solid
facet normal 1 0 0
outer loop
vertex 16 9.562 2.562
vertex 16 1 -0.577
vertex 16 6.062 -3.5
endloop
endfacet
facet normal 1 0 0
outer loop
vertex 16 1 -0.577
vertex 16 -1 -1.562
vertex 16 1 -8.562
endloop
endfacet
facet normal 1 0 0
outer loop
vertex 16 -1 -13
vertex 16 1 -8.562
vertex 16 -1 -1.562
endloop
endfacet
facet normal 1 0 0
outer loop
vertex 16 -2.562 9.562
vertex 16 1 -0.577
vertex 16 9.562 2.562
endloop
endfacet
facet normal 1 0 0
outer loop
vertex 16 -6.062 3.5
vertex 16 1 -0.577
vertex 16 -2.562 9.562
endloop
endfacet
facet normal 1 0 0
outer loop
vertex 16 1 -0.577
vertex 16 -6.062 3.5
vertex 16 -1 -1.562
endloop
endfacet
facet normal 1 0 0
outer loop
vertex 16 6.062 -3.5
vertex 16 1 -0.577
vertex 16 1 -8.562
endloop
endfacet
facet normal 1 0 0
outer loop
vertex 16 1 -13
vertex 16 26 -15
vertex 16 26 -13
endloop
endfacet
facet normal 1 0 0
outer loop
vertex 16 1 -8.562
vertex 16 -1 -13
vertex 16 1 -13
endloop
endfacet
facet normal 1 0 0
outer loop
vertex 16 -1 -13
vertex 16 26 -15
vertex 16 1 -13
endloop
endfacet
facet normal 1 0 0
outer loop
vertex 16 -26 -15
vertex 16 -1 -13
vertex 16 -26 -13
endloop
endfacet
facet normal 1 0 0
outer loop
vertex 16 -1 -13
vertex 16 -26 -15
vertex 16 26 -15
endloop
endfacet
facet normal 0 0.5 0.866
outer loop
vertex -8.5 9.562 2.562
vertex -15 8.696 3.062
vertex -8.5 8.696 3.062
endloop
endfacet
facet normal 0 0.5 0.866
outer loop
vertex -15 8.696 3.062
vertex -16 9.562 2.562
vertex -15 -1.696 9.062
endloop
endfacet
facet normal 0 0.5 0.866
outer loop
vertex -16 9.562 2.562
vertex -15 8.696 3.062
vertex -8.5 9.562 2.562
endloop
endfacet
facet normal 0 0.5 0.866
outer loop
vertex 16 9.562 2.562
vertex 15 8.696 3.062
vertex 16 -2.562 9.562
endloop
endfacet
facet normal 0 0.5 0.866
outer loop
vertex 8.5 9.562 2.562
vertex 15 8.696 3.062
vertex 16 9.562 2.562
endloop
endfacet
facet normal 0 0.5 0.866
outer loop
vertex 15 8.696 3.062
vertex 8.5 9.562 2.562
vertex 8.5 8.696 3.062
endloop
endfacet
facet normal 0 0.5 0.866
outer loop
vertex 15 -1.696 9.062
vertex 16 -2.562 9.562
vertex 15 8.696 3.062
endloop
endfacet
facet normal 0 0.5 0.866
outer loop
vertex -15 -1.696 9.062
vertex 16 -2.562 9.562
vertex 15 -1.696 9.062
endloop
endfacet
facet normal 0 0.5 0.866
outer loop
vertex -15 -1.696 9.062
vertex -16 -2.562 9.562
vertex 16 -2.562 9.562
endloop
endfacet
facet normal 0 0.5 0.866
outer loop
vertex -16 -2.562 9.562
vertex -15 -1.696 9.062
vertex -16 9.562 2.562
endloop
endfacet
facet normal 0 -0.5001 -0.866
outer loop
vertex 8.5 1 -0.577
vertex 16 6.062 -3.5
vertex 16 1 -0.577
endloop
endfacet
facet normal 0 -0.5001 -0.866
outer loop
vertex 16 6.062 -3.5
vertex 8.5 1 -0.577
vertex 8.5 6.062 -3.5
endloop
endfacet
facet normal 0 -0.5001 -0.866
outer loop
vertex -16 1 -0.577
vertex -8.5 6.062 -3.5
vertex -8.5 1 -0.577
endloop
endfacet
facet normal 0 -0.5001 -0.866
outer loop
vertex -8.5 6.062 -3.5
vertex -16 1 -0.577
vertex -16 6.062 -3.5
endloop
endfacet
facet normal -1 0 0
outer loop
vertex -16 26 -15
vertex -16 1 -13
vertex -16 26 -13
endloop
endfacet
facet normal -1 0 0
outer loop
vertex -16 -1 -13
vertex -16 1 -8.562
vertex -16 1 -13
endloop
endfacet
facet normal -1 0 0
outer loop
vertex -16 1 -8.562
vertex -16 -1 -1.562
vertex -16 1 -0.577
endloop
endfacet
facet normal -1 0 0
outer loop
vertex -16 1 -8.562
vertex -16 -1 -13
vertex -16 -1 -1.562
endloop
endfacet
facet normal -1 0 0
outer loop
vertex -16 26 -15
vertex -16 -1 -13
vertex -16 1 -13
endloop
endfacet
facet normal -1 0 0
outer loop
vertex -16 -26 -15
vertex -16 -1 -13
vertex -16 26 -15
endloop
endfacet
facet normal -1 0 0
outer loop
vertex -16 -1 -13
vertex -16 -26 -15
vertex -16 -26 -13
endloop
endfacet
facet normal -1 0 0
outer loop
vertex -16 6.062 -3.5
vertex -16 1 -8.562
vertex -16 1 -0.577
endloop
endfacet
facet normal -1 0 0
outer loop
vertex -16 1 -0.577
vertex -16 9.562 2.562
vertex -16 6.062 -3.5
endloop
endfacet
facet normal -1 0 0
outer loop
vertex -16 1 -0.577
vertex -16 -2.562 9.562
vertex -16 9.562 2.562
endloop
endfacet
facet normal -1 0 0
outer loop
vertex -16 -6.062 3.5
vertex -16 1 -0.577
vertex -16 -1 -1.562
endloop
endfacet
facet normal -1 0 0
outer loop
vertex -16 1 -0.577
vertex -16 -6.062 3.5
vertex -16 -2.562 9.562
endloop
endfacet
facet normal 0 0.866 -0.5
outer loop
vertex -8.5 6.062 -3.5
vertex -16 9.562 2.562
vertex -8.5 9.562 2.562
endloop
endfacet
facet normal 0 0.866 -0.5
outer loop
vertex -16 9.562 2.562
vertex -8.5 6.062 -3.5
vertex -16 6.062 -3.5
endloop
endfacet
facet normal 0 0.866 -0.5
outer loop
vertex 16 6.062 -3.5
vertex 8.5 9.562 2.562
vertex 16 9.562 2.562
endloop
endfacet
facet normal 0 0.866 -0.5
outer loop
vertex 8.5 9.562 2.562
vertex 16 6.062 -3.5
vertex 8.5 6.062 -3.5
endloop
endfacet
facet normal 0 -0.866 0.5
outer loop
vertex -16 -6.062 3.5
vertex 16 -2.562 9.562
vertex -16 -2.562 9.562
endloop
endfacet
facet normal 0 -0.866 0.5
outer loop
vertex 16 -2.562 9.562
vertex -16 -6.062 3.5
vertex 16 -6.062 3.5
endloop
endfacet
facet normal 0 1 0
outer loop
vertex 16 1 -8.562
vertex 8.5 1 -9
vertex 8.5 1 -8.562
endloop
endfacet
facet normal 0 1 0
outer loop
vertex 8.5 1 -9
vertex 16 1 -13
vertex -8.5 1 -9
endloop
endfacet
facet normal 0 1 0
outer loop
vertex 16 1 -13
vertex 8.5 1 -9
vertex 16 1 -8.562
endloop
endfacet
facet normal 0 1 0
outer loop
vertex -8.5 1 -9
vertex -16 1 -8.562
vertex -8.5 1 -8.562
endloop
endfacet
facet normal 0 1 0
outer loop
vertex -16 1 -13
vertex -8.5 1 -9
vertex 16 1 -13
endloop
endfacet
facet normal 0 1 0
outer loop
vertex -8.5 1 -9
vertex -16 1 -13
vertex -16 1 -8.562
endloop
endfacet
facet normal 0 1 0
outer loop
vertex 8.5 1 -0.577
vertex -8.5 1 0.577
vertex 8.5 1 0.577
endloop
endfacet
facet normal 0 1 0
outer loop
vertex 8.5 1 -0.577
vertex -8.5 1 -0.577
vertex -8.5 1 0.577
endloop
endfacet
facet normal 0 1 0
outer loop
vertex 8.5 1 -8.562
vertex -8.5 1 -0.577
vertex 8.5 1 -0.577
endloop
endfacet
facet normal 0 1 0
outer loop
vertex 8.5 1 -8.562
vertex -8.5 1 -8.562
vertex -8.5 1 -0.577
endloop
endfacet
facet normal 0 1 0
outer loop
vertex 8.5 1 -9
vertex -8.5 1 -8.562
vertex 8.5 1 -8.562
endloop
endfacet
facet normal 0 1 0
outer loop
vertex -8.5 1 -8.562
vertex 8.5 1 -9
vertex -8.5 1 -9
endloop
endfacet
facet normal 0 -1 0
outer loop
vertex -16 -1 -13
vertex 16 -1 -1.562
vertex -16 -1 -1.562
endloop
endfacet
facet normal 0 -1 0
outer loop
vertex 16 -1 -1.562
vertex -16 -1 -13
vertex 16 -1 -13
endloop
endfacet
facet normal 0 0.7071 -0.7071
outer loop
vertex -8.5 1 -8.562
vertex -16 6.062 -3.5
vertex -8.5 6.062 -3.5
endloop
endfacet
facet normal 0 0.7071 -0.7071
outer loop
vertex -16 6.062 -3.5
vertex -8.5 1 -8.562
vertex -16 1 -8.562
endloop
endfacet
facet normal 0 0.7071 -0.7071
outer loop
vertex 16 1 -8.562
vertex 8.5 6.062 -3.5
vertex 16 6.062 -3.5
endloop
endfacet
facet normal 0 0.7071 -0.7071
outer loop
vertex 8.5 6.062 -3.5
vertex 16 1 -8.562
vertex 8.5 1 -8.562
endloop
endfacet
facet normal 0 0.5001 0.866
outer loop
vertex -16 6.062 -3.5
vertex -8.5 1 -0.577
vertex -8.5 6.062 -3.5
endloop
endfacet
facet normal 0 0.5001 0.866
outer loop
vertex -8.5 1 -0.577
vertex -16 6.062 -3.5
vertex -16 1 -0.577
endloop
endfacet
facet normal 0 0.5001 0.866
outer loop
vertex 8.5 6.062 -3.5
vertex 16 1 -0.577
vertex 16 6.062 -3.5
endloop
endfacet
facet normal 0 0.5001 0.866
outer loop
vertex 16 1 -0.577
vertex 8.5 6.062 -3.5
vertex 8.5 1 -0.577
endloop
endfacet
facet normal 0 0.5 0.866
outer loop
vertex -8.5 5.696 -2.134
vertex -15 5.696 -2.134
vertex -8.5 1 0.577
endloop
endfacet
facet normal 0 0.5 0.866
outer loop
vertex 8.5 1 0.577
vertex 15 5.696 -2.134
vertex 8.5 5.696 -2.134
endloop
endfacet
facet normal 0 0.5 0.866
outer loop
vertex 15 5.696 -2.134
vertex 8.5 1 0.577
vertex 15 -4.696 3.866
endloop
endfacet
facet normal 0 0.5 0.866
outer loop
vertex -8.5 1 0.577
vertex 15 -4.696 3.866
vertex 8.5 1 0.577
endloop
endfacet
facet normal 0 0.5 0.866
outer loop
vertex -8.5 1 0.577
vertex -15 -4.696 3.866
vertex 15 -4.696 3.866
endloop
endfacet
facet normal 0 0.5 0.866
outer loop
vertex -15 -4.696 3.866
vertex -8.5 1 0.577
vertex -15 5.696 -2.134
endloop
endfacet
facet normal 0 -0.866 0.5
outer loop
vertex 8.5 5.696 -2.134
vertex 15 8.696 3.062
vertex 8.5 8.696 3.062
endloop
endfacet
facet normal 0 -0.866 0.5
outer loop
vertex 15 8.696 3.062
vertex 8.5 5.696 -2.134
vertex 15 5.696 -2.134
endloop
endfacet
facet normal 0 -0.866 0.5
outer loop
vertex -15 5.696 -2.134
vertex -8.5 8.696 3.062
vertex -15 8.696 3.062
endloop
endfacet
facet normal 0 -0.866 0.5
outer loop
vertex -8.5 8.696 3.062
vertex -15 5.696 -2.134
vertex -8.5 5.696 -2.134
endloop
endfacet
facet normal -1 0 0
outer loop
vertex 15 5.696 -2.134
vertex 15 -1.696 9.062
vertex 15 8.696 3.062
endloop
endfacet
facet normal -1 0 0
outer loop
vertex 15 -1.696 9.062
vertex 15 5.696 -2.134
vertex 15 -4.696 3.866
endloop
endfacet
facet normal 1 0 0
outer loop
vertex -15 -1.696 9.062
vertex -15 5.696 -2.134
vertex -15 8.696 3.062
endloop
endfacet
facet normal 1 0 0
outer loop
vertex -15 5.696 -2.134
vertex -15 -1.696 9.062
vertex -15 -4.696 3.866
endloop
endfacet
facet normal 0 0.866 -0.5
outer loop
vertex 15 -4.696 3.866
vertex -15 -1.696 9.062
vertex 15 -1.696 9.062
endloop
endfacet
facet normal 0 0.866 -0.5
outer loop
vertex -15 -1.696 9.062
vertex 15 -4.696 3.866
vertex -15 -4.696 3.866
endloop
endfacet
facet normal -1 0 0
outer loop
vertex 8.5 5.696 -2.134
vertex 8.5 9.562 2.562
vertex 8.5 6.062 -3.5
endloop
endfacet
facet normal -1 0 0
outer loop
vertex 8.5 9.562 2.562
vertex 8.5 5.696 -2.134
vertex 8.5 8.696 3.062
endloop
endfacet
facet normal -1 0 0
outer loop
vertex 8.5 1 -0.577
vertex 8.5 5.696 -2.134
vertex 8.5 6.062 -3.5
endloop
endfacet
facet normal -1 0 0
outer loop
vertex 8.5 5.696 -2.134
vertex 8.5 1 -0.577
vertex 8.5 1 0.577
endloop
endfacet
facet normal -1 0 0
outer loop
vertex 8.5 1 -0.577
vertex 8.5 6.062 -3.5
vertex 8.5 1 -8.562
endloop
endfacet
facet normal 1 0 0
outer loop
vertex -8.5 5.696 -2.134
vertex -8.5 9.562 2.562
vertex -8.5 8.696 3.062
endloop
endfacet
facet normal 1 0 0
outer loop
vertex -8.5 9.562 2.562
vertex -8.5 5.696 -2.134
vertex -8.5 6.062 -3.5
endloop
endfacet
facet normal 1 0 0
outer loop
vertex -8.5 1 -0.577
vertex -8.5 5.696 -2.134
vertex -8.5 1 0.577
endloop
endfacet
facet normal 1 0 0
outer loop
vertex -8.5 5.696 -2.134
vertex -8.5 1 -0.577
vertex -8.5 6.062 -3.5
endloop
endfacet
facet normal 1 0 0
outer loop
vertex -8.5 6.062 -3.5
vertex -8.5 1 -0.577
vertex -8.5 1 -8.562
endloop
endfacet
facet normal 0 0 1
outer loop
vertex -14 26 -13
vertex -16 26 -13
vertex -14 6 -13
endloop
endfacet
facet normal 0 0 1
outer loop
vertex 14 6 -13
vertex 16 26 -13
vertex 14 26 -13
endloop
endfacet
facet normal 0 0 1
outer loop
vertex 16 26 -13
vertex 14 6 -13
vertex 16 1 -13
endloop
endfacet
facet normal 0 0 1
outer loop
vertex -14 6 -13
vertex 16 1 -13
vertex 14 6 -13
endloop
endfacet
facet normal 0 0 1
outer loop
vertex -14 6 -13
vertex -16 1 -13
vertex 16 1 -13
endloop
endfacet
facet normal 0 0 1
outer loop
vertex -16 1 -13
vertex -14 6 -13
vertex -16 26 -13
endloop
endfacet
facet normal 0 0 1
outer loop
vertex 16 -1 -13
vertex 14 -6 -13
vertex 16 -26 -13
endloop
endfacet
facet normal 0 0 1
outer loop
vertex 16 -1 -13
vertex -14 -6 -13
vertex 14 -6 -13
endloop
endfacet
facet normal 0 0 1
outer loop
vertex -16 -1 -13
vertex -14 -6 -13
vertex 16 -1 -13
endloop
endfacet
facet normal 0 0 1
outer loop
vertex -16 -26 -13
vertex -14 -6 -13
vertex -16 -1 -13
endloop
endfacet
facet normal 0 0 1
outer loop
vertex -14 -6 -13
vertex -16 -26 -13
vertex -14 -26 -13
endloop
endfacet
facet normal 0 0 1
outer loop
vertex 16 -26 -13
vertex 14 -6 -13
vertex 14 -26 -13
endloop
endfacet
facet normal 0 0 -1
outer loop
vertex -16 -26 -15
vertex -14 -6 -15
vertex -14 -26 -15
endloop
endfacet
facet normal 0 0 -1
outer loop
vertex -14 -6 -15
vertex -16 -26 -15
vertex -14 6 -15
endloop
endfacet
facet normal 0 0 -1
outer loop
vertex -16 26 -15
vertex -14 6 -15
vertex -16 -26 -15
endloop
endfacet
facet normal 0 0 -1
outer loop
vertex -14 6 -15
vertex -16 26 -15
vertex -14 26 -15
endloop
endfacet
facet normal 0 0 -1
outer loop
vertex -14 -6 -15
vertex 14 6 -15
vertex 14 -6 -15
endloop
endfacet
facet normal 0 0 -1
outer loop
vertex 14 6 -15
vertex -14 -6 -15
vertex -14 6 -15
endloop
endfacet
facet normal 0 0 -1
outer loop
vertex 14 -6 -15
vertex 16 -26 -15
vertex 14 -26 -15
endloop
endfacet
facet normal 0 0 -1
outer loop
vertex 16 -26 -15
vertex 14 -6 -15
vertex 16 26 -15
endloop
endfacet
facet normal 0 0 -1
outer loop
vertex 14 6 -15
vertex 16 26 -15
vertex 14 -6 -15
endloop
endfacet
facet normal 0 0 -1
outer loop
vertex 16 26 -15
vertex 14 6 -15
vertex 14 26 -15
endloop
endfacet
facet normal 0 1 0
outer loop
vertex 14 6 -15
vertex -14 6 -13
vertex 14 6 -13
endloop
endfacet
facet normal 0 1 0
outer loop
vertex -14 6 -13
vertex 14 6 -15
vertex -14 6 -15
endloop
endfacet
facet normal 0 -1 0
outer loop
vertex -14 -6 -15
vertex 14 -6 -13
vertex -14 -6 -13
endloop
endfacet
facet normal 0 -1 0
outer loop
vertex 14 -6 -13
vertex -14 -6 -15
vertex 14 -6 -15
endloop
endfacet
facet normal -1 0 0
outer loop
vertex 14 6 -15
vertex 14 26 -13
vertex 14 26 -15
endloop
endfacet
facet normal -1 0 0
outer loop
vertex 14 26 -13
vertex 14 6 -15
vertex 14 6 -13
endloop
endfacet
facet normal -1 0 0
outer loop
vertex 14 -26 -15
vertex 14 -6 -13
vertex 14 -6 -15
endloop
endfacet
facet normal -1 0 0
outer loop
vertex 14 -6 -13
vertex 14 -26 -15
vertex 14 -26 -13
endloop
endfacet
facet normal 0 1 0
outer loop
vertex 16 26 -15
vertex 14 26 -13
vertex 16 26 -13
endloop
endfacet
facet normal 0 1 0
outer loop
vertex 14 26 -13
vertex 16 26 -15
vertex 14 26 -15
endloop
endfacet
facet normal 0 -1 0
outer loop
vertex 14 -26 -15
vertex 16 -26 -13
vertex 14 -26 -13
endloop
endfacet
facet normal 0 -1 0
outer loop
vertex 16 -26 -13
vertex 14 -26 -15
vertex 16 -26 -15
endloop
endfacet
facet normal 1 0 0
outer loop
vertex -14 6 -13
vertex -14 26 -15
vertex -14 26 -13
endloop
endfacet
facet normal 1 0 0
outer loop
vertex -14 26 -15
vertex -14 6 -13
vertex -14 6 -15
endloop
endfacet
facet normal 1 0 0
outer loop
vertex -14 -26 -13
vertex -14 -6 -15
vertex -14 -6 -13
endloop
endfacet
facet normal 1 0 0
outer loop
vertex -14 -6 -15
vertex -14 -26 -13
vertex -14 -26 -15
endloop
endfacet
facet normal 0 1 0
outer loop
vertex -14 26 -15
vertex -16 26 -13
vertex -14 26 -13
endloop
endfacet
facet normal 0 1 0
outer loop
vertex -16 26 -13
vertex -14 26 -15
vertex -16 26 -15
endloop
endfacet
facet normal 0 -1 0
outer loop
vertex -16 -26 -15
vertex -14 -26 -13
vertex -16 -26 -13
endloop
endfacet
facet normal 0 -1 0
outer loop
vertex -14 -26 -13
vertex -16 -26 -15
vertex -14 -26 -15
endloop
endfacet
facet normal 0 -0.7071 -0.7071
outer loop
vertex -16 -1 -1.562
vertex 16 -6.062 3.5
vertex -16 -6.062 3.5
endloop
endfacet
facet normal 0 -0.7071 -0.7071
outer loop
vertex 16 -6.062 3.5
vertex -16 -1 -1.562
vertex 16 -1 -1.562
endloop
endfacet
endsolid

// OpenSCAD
// This is designed to support the case from http://www.thingiverse.com/thing:92208
// The angle of the support should always be 45 degrees so that it can be printed without
//   support.

/* [Global] */
// Positive angles point camera case down, negative point up
angle=-30; // [-45:45]

difference() {

union() {
// Holder
rotate([angle,0,0])
translate([0,0,3.5]) cube([30+2,12+2,7],center=true);
// Up/Down part
translate([0,0,-5]) cube([30+2,2,18],center=true);

color("red")
translate([0,0,0]) translate([0,0,0]) rotate([0,90,0]) linear_extrude(height = 32, center = true, convexity = 10, twist = 0)
polygon(  points=[[0,0],[7*cos(angle)-7*sin(angle),0],[7*sin(-angle),7*cos(angle)]], paths=[[0,1,2]]);
}


// Cut-out for the camera and the ribbon cable
color("green")
union() {
rotate([angle,0,0]) translate([0,0,1])translate([0,0,15]) cube([30,12,30],center=true);

if(angle>0) {
rotate([angle,0,0]) translate([0,7,14]) cube([17,12,30],center=true);
} else {
rotate([angle,0,0]) translate([0,7,16]) cube([17,12,30],center=true);
}
translate([0,0,1]) translate([0,7,5]) cube([17,12,30],center=true);

}

}

// Base
translate([0,0,-14]) cube([30,12,2],center=true);
// Legs
translate([(2+30)/2-1,0,-14]) cube([2,2+50,2],center=true);
translate([-(2+30)/2+1,0,-14]) cube([2,2+50,2],center=true);


rotate([0,0,180])
color("blue")
translate([0,0,0]) translate([0,0,0]) rotate([0,90,0]) linear_extrude(height = 32, center = true, convexity = 10, twist = 0)
polygon(  points=[[0,0],[7*cos(angle)+7*sin(angle),0],[7*sin(angle),7*cos(angle)]], paths=[[0,1,2]]);
